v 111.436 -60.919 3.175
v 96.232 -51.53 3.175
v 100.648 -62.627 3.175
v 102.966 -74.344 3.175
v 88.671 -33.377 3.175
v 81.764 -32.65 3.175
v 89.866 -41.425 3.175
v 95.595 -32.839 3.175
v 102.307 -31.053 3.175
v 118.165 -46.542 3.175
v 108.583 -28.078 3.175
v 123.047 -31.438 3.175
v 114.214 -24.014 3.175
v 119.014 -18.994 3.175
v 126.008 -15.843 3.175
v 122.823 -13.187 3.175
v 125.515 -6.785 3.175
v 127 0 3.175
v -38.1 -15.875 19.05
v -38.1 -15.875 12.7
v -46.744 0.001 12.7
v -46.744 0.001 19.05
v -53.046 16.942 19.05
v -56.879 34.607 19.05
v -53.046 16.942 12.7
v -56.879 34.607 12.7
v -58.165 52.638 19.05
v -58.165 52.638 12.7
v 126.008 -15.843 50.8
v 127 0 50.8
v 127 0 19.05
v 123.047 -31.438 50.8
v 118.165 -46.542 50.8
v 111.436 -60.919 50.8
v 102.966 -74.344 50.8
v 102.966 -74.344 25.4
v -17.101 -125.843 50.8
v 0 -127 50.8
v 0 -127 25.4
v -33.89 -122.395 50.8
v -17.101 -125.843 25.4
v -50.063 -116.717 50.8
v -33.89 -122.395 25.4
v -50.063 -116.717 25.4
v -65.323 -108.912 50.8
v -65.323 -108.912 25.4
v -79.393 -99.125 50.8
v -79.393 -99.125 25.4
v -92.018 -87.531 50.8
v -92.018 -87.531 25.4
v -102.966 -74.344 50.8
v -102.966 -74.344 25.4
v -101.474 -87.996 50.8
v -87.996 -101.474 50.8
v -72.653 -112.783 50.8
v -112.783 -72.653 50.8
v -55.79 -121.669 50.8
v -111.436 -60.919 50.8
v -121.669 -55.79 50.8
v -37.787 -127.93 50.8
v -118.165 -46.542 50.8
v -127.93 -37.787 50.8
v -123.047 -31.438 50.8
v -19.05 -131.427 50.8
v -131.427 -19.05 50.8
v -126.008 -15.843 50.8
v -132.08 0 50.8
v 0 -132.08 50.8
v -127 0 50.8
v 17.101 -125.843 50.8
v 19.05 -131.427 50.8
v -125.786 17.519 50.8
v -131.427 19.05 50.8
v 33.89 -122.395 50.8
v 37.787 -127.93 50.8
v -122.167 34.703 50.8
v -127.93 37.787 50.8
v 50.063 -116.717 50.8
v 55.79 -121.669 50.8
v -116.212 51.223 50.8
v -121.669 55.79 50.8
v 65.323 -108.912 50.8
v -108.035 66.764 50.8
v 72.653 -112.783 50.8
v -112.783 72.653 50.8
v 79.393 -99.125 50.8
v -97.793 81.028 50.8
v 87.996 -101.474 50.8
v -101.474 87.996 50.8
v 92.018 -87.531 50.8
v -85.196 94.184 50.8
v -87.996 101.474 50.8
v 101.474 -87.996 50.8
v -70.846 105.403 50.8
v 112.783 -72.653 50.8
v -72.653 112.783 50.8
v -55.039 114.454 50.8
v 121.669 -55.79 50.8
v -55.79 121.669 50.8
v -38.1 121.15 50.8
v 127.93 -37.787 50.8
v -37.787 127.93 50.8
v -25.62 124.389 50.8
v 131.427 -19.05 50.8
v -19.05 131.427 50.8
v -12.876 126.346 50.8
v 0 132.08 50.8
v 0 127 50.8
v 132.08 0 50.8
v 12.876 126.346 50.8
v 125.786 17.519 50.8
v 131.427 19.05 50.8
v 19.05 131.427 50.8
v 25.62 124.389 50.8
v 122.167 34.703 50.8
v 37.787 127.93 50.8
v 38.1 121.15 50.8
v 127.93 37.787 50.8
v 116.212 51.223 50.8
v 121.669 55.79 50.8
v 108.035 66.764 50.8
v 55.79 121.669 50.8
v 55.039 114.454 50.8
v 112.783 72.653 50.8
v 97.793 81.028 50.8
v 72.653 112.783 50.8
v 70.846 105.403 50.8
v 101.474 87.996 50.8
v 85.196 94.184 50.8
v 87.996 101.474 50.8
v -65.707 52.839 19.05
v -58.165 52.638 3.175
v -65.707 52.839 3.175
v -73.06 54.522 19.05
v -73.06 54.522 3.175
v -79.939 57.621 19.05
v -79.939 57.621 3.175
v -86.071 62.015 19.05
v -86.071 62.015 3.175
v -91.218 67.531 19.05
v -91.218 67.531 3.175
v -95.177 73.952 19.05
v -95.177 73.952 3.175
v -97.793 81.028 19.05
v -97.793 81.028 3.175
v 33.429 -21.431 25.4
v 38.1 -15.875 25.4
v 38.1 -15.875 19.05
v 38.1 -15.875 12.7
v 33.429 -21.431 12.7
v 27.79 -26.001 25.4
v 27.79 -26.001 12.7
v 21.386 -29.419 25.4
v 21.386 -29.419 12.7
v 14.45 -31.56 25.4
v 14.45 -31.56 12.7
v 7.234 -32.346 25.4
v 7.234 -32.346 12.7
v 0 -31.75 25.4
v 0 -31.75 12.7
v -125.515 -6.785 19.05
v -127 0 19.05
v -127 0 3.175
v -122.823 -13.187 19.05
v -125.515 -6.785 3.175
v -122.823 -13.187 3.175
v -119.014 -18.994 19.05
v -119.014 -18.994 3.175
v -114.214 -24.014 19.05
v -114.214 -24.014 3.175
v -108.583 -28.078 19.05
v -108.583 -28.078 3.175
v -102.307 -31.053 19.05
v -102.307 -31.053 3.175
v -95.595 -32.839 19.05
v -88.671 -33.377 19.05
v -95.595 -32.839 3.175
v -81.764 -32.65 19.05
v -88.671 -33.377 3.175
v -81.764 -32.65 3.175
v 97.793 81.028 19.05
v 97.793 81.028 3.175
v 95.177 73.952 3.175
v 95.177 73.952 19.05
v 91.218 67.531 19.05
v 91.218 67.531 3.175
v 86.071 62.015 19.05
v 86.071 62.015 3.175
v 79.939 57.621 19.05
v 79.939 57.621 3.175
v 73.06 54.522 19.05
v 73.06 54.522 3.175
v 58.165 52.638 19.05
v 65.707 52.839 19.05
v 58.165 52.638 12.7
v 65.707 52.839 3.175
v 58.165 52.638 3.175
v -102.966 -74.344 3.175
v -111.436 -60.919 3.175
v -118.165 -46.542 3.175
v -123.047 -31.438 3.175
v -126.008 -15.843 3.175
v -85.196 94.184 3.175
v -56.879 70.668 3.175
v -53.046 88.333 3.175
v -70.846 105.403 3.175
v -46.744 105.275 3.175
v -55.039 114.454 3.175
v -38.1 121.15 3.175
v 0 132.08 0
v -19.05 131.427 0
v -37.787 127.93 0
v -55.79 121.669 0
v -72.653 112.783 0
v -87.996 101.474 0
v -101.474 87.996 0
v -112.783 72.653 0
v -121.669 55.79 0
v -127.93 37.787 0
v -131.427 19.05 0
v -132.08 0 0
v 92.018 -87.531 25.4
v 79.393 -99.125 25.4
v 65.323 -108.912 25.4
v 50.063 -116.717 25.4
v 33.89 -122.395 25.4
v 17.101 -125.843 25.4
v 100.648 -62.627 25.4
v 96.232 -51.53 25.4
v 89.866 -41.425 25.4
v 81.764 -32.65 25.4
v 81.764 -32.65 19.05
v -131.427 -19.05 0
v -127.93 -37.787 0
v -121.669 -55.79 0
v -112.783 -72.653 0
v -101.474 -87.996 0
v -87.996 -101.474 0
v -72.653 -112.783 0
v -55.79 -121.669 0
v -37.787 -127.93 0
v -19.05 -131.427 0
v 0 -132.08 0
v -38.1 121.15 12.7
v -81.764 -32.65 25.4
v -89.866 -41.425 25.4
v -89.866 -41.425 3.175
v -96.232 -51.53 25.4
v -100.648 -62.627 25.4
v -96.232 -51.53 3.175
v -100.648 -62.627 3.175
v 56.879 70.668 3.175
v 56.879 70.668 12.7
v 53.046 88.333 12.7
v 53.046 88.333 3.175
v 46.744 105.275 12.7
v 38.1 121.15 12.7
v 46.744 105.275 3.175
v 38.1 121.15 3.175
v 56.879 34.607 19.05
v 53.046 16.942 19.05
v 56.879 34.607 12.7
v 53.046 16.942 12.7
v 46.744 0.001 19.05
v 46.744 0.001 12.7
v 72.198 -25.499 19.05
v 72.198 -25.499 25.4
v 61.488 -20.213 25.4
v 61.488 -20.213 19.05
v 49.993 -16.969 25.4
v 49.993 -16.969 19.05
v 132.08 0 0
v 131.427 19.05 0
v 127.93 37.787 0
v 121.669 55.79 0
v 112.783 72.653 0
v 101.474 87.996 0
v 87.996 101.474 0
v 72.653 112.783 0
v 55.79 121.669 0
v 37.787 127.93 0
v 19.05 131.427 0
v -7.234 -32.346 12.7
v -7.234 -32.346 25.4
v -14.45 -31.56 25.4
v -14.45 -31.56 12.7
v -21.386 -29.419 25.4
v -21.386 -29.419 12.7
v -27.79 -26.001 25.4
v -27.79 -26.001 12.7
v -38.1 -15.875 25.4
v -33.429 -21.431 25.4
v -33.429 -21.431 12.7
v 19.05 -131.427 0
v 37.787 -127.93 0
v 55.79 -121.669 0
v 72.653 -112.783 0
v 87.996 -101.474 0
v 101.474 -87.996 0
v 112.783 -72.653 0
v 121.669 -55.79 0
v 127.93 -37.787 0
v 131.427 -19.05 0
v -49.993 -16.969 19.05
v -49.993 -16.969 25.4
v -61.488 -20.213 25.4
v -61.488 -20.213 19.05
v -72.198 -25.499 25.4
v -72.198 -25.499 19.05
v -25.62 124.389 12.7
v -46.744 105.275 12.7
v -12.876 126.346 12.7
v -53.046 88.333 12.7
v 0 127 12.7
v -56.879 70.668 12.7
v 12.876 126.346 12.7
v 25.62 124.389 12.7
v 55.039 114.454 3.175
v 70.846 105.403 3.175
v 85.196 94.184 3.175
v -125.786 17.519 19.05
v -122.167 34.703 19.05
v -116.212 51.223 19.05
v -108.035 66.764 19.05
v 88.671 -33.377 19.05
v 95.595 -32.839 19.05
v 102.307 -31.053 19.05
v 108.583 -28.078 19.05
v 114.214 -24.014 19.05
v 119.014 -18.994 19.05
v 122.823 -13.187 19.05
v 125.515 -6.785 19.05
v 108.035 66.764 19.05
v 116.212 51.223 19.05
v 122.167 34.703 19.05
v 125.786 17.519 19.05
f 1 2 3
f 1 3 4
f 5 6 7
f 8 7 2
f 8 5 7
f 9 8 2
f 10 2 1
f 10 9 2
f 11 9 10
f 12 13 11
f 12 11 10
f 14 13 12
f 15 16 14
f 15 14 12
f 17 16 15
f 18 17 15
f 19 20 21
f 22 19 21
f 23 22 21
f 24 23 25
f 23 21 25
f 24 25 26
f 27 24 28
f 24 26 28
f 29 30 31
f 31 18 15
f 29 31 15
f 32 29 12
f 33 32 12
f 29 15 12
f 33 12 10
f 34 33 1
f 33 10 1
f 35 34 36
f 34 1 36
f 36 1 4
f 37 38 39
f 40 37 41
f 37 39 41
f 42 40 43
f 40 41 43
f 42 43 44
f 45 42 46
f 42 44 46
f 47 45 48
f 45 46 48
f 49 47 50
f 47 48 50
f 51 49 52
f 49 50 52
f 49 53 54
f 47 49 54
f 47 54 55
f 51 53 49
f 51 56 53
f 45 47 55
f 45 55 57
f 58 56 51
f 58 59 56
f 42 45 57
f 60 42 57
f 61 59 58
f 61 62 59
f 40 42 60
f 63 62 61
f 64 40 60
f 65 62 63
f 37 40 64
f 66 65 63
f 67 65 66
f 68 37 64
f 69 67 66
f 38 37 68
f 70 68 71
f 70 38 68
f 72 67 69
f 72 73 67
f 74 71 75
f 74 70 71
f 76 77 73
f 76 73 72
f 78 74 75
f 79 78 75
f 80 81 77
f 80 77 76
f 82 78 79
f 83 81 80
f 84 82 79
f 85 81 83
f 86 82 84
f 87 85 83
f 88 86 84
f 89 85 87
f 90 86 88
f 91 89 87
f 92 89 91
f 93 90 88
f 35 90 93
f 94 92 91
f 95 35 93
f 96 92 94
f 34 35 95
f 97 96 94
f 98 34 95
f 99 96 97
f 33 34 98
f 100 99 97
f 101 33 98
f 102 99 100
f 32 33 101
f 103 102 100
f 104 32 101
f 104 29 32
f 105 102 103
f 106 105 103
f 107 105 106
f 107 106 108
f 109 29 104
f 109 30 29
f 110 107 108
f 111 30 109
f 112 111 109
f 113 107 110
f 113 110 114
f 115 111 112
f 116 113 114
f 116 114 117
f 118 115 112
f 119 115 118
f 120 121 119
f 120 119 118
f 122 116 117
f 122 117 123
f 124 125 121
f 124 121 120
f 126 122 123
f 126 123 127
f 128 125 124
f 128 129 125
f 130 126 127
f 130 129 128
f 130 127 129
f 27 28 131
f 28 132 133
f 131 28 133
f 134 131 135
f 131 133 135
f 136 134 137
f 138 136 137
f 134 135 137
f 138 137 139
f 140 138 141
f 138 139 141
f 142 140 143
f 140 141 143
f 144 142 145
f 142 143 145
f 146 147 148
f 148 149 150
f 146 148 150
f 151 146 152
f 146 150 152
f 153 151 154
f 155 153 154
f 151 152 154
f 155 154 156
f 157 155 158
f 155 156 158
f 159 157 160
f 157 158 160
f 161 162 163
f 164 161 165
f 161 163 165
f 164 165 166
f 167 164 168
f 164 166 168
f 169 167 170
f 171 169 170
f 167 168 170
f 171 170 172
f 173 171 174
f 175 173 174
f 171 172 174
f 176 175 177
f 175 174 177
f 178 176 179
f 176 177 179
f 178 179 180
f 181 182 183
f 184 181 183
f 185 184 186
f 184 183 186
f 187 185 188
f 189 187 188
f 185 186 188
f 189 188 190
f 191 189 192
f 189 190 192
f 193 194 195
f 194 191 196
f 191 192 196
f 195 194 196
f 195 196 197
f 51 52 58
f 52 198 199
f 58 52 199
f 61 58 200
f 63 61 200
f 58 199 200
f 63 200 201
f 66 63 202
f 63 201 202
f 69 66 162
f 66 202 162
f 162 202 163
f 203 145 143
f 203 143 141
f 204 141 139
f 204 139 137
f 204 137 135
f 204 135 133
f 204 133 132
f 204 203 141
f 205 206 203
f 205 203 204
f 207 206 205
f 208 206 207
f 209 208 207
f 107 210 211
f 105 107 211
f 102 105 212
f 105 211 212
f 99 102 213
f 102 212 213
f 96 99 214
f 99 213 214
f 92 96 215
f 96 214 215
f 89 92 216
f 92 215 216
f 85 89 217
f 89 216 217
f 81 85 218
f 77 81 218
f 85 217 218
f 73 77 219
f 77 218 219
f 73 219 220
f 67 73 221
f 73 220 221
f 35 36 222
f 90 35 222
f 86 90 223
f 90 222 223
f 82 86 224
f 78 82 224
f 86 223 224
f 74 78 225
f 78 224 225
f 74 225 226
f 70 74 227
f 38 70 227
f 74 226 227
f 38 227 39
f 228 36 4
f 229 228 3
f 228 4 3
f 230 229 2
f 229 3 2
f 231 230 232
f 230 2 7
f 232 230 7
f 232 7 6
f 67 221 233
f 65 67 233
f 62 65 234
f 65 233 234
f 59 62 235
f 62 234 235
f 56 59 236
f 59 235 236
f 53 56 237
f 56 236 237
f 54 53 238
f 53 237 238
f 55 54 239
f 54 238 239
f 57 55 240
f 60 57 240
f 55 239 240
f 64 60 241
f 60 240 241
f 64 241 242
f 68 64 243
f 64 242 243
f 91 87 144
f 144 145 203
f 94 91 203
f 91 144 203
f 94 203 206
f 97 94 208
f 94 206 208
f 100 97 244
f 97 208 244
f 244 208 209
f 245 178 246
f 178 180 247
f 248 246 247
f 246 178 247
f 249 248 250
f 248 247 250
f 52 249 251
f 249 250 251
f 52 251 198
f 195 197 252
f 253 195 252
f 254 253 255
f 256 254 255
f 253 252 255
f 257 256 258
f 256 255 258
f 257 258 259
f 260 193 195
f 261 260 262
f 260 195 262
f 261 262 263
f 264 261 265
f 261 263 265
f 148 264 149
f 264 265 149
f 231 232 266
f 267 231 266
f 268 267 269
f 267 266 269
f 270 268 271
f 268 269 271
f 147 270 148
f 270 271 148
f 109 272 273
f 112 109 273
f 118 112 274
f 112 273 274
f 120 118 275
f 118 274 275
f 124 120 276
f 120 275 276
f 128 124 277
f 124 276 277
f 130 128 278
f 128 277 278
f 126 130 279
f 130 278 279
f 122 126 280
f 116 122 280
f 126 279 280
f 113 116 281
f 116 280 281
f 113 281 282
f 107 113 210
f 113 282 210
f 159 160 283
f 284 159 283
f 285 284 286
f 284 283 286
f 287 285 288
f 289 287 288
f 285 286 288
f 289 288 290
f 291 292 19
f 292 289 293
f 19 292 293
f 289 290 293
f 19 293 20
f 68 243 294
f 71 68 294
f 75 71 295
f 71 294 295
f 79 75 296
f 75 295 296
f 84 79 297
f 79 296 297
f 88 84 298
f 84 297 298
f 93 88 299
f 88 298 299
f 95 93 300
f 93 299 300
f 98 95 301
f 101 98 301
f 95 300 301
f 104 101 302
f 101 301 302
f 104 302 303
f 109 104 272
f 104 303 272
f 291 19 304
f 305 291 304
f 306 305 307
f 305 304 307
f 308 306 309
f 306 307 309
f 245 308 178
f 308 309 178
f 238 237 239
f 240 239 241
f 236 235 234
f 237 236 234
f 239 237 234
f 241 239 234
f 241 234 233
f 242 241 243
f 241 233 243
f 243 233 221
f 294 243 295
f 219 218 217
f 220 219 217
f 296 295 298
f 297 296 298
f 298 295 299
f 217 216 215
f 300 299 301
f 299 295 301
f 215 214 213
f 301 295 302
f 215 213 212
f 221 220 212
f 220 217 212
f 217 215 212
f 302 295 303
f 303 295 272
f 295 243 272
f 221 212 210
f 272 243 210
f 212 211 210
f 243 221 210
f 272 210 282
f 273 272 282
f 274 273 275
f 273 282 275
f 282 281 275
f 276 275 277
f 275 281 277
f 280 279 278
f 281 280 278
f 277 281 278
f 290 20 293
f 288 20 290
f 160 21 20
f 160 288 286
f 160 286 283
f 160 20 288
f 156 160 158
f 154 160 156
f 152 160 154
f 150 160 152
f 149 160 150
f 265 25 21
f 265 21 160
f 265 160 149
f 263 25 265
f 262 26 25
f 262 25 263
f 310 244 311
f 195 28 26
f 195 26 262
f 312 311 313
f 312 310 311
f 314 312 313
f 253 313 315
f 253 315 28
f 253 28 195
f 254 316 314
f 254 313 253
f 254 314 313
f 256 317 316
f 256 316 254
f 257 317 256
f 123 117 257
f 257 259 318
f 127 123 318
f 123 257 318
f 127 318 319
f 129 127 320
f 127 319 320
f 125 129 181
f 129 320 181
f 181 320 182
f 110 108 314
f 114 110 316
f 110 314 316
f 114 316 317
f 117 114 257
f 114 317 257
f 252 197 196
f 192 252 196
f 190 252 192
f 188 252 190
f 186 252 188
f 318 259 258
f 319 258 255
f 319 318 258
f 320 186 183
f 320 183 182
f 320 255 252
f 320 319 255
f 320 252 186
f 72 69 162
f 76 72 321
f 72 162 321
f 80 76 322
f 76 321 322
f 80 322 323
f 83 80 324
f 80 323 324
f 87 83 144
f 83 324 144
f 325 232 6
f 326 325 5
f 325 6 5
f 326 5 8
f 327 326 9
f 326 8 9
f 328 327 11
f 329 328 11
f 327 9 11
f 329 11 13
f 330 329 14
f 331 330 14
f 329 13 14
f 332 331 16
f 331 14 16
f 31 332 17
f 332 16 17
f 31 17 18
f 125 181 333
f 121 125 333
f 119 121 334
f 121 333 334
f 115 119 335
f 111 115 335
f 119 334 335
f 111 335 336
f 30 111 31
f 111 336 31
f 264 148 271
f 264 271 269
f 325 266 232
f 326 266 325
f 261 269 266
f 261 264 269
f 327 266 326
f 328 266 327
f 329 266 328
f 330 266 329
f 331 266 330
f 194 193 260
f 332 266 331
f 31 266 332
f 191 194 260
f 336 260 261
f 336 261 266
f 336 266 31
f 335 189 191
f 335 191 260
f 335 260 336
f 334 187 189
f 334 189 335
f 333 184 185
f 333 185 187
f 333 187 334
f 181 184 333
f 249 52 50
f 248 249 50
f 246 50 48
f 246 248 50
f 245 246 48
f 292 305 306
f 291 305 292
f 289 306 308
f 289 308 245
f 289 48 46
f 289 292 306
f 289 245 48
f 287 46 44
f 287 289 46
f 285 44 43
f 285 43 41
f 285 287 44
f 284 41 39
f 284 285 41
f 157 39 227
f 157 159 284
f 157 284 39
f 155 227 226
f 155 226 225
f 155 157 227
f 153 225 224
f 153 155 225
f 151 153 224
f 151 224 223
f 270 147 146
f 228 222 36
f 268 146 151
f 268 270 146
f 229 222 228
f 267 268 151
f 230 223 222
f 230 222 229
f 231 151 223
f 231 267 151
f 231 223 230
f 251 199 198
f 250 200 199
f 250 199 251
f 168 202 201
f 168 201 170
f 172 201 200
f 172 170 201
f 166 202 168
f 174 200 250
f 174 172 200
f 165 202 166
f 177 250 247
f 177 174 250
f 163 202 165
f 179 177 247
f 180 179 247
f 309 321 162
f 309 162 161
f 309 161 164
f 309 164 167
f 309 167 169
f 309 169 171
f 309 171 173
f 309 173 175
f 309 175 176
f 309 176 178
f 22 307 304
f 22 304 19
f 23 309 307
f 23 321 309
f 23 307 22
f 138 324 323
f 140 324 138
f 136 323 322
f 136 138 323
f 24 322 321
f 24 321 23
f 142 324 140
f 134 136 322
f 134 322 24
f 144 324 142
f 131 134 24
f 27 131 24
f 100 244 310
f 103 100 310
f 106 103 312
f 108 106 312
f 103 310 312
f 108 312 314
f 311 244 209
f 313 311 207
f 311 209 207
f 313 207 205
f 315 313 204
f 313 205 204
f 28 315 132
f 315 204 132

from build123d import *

# Parameters (mm, degrees)
F1_DEPTH = 50.8
F2_DEPTH = 12.7
F3_DEPTH = 25.4
F4_DEPTH = 19.05
F5_DEPTH = 3.175


with BuildPart() as f1:
    # F0 (on Top) → F1 (new body)
    with BuildSketch(Plane.XY):
        with BuildLine():
            ThreePointArc((97.792826, 81.028163), (119.475288, 43.065712), (127, 0))
            Line((127, 0), (132.08, 0))
            ThreePointArc((132.08, 0), (94.988487, 94.988487), (0, 132.08))
            Line((0, 132.08), (0, 127))
            ThreePointArc((0, 127), (19.273228, 125.529051), (38.1, 121.150279))
            ThreePointArc((38.1, 121.150279), (70.846038, 105.40322), (97.792826, 81.028163))
        make_face()
        with BuildLine():
            Line((0, 127), (0, 132.08))
            ThreePointArc((0, 132.08), (-94.988487, 94.988487), (-132.08, 0))
            Line((-132.08, 0), (-127, 0))
            ThreePointArc((-127, 0), (-119.475288, 43.065712), (-97.792826, 81.028163))
            ThreePointArc((-97.792826, 81.028163), (-70.846038, 105.40322), (-38.1, 121.150279))
            ThreePointArc((-38.1, 121.150279), (-19.273228, 125.529051), (0, 127))
        make_face()
        with BuildLine():
            Line((132.08, 0), (127, 0))
            ThreePointArc((127, 0), (120.842224, -39.066058), (102.966034, -74.343768))
            ThreePointArc((102.966034, -74.343768), (57.824482, -113.07223), (0, -127))
            Line((0, -127), (0, -132.08))
            ThreePointArc((0, -132.08), (94.988487, -94.988487), (132.08, 0))
        make_face()
        with BuildLine():
            Line((0, -132.08), (0, -127))
            ThreePointArc((0, -127), (-57.824482, -113.07223), (-102.966034, -74.343768))
            ThreePointArc((-102.966034, -74.343768), (-120.842224, -39.066058), (-127, 0))
            Line((-127, 0), (-132.08, 0))
            ThreePointArc((-132.08, 0), (-94.988487, -94.988487), (0, -132.08))
        make_face()
    extrude(amount=F1_DEPTH)

    # F0 (on Top) → F2 (join)
    with BuildSketch(Plane.XY):
        with BuildLine():
            ThreePointArc((58.165355, 52.637639), (53.045829, 88.332878), (38.1, 121.150279))
            ThreePointArc((38.1, 121.150279), (19.273228, 125.529051), (0, 127))
            ThreePointArc((0, 127), (-19.273228, 125.529051), (-38.1, 121.150279))
            ThreePointArc((-38.1, 121.150279), (-53.045829, 88.332878), (-58.165355, 52.637639))
            ThreePointArc((-58.165355, 52.637639), (-53.045829, 16.942401), (-38.1, -15.875))
            ThreePointArc((-38.1, -15.875), (-21.38592, -29.418708), (0, -31.75))
            ThreePointArc((0, -31.75), (21.38592, -29.418708), (38.1, -15.875))
            ThreePointArc((38.1, -15.875), (53.045829, 16.942401), (58.165355, 52.637639))
        make_face()
    extrude(amount=F2_DEPTH)

    # F0 (on Top) → F3 (join)
    with BuildSketch(Plane.XY):
        with BuildLine():
            ThreePointArc((0, -127), (57.824482, -113.07223), (102.966034, -74.343768))
            ThreePointArc((102.966034, -74.343768), (96.231727, -51.530394), (81.764056, -32.649519))
            ThreePointArc((81.764056, -32.649519), (61.48768, -20.212899), (38.1, -15.875))
            ThreePointArc((38.1, -15.875), (21.38592, -29.418708), (0, -31.75))
            ThreePointArc((0, -31.75), (-21.38592, -29.418708), (-38.1, -15.875))
            ThreePointArc((-38.1, -15.875), (-61.48768, -20.212899), (-81.764056, -32.649519))
            ThreePointArc((-81.764056, -32.649519), (-96.231727, -51.530394), (-102.966034, -74.343768))
            ThreePointArc((-102.966034, -74.343768), (-57.824482, -113.07223), (0, -127))
        make_face()
    extrude(amount=F3_DEPTH)

    # F0 (on Top) → F4 (join)
    with BuildSketch(Plane.XY):
        with BuildLine():
            ThreePointArc((-97.792826, 81.028163), (-119.475288, 43.065712), (-127, 0))
            ThreePointArc((-127, 0), (-111.491203, -26.174529), (-81.764056, -32.649519))
            ThreePointArc((-81.764056, -32.649519), (-61.48768, -20.212899), (-38.1, -15.875))
            ThreePointArc((-38.1, -15.875), (-53.045829, 16.942401), (-58.165355, 52.637639))
            ThreePointArc((-58.165355, 52.637639), (-83.113803, 59.665873), (-97.792826, 81.028163))
        make_face()
        with BuildLine():
            ThreePointArc((81.764056, -32.649519), (111.491203, -26.174529), (127, 0))
            ThreePointArc((127, 0), (119.475288, 43.065712), (97.792826, 81.028163))
            ThreePointArc((97.792826, 81.028163), (83.113803, 59.665873), (58.165355, 52.637639))
            ThreePointArc((58.165355, 52.637639), (53.045829, 16.942401), (38.1, -15.875))
            ThreePointArc((38.1, -15.875), (61.48768, -20.212899), (81.764056, -32.649519))
        make_face()
    extrude(amount=F4_DEPTH)

    # F0 (on Top) → F5 (join)
    with BuildSketch(Plane.XY):
        with BuildLine():
            ThreePointArc((58.165355, 52.637639), (83.113803, 59.665873), (97.792826, 81.028163))
            ThreePointArc((97.792826, 81.028163), (70.846038, 105.40322), (38.1, 121.150279))
            ThreePointArc((38.1, 121.150279), (53.045829, 88.332878), (58.165355, 52.637639))
        make_face()
        with BuildLine():
            ThreePointArc((102.966034, -74.343768), (120.842224, -39.066058), (127, 0))
            ThreePointArc((127, 0), (111.491203, -26.174529), (81.764056, -32.649519))
            ThreePointArc((81.764056, -32.649519), (96.231727, -51.530394), (102.966034, -74.343768))
        make_face()
        with BuildLine():
            ThreePointArc((-127, 0), (-120.842224, -39.066058), (-102.966034, -74.343768))
            ThreePointArc((-102.966034, -74.343768), (-96.231727, -51.530394), (-81.764056, -32.649519))
            ThreePointArc((-81.764056, -32.649519), (-111.491203, -26.174529), (-127, 0))
        make_face()
        with BuildLine():
            ThreePointArc((-58.165355, 52.637639), (-53.045829, 88.332878), (-38.1, 121.150279))
            ThreePointArc((-38.1, 121.150279), (-70.846038, 105.40322), (-97.792826, 81.028163))
            ThreePointArc((-97.792826, 81.028163), (-83.113803, 59.665873), (-58.165355, 52.637639))
        make_face()
    extrude(amount=F5_DEPTH)


solid = f1.part
